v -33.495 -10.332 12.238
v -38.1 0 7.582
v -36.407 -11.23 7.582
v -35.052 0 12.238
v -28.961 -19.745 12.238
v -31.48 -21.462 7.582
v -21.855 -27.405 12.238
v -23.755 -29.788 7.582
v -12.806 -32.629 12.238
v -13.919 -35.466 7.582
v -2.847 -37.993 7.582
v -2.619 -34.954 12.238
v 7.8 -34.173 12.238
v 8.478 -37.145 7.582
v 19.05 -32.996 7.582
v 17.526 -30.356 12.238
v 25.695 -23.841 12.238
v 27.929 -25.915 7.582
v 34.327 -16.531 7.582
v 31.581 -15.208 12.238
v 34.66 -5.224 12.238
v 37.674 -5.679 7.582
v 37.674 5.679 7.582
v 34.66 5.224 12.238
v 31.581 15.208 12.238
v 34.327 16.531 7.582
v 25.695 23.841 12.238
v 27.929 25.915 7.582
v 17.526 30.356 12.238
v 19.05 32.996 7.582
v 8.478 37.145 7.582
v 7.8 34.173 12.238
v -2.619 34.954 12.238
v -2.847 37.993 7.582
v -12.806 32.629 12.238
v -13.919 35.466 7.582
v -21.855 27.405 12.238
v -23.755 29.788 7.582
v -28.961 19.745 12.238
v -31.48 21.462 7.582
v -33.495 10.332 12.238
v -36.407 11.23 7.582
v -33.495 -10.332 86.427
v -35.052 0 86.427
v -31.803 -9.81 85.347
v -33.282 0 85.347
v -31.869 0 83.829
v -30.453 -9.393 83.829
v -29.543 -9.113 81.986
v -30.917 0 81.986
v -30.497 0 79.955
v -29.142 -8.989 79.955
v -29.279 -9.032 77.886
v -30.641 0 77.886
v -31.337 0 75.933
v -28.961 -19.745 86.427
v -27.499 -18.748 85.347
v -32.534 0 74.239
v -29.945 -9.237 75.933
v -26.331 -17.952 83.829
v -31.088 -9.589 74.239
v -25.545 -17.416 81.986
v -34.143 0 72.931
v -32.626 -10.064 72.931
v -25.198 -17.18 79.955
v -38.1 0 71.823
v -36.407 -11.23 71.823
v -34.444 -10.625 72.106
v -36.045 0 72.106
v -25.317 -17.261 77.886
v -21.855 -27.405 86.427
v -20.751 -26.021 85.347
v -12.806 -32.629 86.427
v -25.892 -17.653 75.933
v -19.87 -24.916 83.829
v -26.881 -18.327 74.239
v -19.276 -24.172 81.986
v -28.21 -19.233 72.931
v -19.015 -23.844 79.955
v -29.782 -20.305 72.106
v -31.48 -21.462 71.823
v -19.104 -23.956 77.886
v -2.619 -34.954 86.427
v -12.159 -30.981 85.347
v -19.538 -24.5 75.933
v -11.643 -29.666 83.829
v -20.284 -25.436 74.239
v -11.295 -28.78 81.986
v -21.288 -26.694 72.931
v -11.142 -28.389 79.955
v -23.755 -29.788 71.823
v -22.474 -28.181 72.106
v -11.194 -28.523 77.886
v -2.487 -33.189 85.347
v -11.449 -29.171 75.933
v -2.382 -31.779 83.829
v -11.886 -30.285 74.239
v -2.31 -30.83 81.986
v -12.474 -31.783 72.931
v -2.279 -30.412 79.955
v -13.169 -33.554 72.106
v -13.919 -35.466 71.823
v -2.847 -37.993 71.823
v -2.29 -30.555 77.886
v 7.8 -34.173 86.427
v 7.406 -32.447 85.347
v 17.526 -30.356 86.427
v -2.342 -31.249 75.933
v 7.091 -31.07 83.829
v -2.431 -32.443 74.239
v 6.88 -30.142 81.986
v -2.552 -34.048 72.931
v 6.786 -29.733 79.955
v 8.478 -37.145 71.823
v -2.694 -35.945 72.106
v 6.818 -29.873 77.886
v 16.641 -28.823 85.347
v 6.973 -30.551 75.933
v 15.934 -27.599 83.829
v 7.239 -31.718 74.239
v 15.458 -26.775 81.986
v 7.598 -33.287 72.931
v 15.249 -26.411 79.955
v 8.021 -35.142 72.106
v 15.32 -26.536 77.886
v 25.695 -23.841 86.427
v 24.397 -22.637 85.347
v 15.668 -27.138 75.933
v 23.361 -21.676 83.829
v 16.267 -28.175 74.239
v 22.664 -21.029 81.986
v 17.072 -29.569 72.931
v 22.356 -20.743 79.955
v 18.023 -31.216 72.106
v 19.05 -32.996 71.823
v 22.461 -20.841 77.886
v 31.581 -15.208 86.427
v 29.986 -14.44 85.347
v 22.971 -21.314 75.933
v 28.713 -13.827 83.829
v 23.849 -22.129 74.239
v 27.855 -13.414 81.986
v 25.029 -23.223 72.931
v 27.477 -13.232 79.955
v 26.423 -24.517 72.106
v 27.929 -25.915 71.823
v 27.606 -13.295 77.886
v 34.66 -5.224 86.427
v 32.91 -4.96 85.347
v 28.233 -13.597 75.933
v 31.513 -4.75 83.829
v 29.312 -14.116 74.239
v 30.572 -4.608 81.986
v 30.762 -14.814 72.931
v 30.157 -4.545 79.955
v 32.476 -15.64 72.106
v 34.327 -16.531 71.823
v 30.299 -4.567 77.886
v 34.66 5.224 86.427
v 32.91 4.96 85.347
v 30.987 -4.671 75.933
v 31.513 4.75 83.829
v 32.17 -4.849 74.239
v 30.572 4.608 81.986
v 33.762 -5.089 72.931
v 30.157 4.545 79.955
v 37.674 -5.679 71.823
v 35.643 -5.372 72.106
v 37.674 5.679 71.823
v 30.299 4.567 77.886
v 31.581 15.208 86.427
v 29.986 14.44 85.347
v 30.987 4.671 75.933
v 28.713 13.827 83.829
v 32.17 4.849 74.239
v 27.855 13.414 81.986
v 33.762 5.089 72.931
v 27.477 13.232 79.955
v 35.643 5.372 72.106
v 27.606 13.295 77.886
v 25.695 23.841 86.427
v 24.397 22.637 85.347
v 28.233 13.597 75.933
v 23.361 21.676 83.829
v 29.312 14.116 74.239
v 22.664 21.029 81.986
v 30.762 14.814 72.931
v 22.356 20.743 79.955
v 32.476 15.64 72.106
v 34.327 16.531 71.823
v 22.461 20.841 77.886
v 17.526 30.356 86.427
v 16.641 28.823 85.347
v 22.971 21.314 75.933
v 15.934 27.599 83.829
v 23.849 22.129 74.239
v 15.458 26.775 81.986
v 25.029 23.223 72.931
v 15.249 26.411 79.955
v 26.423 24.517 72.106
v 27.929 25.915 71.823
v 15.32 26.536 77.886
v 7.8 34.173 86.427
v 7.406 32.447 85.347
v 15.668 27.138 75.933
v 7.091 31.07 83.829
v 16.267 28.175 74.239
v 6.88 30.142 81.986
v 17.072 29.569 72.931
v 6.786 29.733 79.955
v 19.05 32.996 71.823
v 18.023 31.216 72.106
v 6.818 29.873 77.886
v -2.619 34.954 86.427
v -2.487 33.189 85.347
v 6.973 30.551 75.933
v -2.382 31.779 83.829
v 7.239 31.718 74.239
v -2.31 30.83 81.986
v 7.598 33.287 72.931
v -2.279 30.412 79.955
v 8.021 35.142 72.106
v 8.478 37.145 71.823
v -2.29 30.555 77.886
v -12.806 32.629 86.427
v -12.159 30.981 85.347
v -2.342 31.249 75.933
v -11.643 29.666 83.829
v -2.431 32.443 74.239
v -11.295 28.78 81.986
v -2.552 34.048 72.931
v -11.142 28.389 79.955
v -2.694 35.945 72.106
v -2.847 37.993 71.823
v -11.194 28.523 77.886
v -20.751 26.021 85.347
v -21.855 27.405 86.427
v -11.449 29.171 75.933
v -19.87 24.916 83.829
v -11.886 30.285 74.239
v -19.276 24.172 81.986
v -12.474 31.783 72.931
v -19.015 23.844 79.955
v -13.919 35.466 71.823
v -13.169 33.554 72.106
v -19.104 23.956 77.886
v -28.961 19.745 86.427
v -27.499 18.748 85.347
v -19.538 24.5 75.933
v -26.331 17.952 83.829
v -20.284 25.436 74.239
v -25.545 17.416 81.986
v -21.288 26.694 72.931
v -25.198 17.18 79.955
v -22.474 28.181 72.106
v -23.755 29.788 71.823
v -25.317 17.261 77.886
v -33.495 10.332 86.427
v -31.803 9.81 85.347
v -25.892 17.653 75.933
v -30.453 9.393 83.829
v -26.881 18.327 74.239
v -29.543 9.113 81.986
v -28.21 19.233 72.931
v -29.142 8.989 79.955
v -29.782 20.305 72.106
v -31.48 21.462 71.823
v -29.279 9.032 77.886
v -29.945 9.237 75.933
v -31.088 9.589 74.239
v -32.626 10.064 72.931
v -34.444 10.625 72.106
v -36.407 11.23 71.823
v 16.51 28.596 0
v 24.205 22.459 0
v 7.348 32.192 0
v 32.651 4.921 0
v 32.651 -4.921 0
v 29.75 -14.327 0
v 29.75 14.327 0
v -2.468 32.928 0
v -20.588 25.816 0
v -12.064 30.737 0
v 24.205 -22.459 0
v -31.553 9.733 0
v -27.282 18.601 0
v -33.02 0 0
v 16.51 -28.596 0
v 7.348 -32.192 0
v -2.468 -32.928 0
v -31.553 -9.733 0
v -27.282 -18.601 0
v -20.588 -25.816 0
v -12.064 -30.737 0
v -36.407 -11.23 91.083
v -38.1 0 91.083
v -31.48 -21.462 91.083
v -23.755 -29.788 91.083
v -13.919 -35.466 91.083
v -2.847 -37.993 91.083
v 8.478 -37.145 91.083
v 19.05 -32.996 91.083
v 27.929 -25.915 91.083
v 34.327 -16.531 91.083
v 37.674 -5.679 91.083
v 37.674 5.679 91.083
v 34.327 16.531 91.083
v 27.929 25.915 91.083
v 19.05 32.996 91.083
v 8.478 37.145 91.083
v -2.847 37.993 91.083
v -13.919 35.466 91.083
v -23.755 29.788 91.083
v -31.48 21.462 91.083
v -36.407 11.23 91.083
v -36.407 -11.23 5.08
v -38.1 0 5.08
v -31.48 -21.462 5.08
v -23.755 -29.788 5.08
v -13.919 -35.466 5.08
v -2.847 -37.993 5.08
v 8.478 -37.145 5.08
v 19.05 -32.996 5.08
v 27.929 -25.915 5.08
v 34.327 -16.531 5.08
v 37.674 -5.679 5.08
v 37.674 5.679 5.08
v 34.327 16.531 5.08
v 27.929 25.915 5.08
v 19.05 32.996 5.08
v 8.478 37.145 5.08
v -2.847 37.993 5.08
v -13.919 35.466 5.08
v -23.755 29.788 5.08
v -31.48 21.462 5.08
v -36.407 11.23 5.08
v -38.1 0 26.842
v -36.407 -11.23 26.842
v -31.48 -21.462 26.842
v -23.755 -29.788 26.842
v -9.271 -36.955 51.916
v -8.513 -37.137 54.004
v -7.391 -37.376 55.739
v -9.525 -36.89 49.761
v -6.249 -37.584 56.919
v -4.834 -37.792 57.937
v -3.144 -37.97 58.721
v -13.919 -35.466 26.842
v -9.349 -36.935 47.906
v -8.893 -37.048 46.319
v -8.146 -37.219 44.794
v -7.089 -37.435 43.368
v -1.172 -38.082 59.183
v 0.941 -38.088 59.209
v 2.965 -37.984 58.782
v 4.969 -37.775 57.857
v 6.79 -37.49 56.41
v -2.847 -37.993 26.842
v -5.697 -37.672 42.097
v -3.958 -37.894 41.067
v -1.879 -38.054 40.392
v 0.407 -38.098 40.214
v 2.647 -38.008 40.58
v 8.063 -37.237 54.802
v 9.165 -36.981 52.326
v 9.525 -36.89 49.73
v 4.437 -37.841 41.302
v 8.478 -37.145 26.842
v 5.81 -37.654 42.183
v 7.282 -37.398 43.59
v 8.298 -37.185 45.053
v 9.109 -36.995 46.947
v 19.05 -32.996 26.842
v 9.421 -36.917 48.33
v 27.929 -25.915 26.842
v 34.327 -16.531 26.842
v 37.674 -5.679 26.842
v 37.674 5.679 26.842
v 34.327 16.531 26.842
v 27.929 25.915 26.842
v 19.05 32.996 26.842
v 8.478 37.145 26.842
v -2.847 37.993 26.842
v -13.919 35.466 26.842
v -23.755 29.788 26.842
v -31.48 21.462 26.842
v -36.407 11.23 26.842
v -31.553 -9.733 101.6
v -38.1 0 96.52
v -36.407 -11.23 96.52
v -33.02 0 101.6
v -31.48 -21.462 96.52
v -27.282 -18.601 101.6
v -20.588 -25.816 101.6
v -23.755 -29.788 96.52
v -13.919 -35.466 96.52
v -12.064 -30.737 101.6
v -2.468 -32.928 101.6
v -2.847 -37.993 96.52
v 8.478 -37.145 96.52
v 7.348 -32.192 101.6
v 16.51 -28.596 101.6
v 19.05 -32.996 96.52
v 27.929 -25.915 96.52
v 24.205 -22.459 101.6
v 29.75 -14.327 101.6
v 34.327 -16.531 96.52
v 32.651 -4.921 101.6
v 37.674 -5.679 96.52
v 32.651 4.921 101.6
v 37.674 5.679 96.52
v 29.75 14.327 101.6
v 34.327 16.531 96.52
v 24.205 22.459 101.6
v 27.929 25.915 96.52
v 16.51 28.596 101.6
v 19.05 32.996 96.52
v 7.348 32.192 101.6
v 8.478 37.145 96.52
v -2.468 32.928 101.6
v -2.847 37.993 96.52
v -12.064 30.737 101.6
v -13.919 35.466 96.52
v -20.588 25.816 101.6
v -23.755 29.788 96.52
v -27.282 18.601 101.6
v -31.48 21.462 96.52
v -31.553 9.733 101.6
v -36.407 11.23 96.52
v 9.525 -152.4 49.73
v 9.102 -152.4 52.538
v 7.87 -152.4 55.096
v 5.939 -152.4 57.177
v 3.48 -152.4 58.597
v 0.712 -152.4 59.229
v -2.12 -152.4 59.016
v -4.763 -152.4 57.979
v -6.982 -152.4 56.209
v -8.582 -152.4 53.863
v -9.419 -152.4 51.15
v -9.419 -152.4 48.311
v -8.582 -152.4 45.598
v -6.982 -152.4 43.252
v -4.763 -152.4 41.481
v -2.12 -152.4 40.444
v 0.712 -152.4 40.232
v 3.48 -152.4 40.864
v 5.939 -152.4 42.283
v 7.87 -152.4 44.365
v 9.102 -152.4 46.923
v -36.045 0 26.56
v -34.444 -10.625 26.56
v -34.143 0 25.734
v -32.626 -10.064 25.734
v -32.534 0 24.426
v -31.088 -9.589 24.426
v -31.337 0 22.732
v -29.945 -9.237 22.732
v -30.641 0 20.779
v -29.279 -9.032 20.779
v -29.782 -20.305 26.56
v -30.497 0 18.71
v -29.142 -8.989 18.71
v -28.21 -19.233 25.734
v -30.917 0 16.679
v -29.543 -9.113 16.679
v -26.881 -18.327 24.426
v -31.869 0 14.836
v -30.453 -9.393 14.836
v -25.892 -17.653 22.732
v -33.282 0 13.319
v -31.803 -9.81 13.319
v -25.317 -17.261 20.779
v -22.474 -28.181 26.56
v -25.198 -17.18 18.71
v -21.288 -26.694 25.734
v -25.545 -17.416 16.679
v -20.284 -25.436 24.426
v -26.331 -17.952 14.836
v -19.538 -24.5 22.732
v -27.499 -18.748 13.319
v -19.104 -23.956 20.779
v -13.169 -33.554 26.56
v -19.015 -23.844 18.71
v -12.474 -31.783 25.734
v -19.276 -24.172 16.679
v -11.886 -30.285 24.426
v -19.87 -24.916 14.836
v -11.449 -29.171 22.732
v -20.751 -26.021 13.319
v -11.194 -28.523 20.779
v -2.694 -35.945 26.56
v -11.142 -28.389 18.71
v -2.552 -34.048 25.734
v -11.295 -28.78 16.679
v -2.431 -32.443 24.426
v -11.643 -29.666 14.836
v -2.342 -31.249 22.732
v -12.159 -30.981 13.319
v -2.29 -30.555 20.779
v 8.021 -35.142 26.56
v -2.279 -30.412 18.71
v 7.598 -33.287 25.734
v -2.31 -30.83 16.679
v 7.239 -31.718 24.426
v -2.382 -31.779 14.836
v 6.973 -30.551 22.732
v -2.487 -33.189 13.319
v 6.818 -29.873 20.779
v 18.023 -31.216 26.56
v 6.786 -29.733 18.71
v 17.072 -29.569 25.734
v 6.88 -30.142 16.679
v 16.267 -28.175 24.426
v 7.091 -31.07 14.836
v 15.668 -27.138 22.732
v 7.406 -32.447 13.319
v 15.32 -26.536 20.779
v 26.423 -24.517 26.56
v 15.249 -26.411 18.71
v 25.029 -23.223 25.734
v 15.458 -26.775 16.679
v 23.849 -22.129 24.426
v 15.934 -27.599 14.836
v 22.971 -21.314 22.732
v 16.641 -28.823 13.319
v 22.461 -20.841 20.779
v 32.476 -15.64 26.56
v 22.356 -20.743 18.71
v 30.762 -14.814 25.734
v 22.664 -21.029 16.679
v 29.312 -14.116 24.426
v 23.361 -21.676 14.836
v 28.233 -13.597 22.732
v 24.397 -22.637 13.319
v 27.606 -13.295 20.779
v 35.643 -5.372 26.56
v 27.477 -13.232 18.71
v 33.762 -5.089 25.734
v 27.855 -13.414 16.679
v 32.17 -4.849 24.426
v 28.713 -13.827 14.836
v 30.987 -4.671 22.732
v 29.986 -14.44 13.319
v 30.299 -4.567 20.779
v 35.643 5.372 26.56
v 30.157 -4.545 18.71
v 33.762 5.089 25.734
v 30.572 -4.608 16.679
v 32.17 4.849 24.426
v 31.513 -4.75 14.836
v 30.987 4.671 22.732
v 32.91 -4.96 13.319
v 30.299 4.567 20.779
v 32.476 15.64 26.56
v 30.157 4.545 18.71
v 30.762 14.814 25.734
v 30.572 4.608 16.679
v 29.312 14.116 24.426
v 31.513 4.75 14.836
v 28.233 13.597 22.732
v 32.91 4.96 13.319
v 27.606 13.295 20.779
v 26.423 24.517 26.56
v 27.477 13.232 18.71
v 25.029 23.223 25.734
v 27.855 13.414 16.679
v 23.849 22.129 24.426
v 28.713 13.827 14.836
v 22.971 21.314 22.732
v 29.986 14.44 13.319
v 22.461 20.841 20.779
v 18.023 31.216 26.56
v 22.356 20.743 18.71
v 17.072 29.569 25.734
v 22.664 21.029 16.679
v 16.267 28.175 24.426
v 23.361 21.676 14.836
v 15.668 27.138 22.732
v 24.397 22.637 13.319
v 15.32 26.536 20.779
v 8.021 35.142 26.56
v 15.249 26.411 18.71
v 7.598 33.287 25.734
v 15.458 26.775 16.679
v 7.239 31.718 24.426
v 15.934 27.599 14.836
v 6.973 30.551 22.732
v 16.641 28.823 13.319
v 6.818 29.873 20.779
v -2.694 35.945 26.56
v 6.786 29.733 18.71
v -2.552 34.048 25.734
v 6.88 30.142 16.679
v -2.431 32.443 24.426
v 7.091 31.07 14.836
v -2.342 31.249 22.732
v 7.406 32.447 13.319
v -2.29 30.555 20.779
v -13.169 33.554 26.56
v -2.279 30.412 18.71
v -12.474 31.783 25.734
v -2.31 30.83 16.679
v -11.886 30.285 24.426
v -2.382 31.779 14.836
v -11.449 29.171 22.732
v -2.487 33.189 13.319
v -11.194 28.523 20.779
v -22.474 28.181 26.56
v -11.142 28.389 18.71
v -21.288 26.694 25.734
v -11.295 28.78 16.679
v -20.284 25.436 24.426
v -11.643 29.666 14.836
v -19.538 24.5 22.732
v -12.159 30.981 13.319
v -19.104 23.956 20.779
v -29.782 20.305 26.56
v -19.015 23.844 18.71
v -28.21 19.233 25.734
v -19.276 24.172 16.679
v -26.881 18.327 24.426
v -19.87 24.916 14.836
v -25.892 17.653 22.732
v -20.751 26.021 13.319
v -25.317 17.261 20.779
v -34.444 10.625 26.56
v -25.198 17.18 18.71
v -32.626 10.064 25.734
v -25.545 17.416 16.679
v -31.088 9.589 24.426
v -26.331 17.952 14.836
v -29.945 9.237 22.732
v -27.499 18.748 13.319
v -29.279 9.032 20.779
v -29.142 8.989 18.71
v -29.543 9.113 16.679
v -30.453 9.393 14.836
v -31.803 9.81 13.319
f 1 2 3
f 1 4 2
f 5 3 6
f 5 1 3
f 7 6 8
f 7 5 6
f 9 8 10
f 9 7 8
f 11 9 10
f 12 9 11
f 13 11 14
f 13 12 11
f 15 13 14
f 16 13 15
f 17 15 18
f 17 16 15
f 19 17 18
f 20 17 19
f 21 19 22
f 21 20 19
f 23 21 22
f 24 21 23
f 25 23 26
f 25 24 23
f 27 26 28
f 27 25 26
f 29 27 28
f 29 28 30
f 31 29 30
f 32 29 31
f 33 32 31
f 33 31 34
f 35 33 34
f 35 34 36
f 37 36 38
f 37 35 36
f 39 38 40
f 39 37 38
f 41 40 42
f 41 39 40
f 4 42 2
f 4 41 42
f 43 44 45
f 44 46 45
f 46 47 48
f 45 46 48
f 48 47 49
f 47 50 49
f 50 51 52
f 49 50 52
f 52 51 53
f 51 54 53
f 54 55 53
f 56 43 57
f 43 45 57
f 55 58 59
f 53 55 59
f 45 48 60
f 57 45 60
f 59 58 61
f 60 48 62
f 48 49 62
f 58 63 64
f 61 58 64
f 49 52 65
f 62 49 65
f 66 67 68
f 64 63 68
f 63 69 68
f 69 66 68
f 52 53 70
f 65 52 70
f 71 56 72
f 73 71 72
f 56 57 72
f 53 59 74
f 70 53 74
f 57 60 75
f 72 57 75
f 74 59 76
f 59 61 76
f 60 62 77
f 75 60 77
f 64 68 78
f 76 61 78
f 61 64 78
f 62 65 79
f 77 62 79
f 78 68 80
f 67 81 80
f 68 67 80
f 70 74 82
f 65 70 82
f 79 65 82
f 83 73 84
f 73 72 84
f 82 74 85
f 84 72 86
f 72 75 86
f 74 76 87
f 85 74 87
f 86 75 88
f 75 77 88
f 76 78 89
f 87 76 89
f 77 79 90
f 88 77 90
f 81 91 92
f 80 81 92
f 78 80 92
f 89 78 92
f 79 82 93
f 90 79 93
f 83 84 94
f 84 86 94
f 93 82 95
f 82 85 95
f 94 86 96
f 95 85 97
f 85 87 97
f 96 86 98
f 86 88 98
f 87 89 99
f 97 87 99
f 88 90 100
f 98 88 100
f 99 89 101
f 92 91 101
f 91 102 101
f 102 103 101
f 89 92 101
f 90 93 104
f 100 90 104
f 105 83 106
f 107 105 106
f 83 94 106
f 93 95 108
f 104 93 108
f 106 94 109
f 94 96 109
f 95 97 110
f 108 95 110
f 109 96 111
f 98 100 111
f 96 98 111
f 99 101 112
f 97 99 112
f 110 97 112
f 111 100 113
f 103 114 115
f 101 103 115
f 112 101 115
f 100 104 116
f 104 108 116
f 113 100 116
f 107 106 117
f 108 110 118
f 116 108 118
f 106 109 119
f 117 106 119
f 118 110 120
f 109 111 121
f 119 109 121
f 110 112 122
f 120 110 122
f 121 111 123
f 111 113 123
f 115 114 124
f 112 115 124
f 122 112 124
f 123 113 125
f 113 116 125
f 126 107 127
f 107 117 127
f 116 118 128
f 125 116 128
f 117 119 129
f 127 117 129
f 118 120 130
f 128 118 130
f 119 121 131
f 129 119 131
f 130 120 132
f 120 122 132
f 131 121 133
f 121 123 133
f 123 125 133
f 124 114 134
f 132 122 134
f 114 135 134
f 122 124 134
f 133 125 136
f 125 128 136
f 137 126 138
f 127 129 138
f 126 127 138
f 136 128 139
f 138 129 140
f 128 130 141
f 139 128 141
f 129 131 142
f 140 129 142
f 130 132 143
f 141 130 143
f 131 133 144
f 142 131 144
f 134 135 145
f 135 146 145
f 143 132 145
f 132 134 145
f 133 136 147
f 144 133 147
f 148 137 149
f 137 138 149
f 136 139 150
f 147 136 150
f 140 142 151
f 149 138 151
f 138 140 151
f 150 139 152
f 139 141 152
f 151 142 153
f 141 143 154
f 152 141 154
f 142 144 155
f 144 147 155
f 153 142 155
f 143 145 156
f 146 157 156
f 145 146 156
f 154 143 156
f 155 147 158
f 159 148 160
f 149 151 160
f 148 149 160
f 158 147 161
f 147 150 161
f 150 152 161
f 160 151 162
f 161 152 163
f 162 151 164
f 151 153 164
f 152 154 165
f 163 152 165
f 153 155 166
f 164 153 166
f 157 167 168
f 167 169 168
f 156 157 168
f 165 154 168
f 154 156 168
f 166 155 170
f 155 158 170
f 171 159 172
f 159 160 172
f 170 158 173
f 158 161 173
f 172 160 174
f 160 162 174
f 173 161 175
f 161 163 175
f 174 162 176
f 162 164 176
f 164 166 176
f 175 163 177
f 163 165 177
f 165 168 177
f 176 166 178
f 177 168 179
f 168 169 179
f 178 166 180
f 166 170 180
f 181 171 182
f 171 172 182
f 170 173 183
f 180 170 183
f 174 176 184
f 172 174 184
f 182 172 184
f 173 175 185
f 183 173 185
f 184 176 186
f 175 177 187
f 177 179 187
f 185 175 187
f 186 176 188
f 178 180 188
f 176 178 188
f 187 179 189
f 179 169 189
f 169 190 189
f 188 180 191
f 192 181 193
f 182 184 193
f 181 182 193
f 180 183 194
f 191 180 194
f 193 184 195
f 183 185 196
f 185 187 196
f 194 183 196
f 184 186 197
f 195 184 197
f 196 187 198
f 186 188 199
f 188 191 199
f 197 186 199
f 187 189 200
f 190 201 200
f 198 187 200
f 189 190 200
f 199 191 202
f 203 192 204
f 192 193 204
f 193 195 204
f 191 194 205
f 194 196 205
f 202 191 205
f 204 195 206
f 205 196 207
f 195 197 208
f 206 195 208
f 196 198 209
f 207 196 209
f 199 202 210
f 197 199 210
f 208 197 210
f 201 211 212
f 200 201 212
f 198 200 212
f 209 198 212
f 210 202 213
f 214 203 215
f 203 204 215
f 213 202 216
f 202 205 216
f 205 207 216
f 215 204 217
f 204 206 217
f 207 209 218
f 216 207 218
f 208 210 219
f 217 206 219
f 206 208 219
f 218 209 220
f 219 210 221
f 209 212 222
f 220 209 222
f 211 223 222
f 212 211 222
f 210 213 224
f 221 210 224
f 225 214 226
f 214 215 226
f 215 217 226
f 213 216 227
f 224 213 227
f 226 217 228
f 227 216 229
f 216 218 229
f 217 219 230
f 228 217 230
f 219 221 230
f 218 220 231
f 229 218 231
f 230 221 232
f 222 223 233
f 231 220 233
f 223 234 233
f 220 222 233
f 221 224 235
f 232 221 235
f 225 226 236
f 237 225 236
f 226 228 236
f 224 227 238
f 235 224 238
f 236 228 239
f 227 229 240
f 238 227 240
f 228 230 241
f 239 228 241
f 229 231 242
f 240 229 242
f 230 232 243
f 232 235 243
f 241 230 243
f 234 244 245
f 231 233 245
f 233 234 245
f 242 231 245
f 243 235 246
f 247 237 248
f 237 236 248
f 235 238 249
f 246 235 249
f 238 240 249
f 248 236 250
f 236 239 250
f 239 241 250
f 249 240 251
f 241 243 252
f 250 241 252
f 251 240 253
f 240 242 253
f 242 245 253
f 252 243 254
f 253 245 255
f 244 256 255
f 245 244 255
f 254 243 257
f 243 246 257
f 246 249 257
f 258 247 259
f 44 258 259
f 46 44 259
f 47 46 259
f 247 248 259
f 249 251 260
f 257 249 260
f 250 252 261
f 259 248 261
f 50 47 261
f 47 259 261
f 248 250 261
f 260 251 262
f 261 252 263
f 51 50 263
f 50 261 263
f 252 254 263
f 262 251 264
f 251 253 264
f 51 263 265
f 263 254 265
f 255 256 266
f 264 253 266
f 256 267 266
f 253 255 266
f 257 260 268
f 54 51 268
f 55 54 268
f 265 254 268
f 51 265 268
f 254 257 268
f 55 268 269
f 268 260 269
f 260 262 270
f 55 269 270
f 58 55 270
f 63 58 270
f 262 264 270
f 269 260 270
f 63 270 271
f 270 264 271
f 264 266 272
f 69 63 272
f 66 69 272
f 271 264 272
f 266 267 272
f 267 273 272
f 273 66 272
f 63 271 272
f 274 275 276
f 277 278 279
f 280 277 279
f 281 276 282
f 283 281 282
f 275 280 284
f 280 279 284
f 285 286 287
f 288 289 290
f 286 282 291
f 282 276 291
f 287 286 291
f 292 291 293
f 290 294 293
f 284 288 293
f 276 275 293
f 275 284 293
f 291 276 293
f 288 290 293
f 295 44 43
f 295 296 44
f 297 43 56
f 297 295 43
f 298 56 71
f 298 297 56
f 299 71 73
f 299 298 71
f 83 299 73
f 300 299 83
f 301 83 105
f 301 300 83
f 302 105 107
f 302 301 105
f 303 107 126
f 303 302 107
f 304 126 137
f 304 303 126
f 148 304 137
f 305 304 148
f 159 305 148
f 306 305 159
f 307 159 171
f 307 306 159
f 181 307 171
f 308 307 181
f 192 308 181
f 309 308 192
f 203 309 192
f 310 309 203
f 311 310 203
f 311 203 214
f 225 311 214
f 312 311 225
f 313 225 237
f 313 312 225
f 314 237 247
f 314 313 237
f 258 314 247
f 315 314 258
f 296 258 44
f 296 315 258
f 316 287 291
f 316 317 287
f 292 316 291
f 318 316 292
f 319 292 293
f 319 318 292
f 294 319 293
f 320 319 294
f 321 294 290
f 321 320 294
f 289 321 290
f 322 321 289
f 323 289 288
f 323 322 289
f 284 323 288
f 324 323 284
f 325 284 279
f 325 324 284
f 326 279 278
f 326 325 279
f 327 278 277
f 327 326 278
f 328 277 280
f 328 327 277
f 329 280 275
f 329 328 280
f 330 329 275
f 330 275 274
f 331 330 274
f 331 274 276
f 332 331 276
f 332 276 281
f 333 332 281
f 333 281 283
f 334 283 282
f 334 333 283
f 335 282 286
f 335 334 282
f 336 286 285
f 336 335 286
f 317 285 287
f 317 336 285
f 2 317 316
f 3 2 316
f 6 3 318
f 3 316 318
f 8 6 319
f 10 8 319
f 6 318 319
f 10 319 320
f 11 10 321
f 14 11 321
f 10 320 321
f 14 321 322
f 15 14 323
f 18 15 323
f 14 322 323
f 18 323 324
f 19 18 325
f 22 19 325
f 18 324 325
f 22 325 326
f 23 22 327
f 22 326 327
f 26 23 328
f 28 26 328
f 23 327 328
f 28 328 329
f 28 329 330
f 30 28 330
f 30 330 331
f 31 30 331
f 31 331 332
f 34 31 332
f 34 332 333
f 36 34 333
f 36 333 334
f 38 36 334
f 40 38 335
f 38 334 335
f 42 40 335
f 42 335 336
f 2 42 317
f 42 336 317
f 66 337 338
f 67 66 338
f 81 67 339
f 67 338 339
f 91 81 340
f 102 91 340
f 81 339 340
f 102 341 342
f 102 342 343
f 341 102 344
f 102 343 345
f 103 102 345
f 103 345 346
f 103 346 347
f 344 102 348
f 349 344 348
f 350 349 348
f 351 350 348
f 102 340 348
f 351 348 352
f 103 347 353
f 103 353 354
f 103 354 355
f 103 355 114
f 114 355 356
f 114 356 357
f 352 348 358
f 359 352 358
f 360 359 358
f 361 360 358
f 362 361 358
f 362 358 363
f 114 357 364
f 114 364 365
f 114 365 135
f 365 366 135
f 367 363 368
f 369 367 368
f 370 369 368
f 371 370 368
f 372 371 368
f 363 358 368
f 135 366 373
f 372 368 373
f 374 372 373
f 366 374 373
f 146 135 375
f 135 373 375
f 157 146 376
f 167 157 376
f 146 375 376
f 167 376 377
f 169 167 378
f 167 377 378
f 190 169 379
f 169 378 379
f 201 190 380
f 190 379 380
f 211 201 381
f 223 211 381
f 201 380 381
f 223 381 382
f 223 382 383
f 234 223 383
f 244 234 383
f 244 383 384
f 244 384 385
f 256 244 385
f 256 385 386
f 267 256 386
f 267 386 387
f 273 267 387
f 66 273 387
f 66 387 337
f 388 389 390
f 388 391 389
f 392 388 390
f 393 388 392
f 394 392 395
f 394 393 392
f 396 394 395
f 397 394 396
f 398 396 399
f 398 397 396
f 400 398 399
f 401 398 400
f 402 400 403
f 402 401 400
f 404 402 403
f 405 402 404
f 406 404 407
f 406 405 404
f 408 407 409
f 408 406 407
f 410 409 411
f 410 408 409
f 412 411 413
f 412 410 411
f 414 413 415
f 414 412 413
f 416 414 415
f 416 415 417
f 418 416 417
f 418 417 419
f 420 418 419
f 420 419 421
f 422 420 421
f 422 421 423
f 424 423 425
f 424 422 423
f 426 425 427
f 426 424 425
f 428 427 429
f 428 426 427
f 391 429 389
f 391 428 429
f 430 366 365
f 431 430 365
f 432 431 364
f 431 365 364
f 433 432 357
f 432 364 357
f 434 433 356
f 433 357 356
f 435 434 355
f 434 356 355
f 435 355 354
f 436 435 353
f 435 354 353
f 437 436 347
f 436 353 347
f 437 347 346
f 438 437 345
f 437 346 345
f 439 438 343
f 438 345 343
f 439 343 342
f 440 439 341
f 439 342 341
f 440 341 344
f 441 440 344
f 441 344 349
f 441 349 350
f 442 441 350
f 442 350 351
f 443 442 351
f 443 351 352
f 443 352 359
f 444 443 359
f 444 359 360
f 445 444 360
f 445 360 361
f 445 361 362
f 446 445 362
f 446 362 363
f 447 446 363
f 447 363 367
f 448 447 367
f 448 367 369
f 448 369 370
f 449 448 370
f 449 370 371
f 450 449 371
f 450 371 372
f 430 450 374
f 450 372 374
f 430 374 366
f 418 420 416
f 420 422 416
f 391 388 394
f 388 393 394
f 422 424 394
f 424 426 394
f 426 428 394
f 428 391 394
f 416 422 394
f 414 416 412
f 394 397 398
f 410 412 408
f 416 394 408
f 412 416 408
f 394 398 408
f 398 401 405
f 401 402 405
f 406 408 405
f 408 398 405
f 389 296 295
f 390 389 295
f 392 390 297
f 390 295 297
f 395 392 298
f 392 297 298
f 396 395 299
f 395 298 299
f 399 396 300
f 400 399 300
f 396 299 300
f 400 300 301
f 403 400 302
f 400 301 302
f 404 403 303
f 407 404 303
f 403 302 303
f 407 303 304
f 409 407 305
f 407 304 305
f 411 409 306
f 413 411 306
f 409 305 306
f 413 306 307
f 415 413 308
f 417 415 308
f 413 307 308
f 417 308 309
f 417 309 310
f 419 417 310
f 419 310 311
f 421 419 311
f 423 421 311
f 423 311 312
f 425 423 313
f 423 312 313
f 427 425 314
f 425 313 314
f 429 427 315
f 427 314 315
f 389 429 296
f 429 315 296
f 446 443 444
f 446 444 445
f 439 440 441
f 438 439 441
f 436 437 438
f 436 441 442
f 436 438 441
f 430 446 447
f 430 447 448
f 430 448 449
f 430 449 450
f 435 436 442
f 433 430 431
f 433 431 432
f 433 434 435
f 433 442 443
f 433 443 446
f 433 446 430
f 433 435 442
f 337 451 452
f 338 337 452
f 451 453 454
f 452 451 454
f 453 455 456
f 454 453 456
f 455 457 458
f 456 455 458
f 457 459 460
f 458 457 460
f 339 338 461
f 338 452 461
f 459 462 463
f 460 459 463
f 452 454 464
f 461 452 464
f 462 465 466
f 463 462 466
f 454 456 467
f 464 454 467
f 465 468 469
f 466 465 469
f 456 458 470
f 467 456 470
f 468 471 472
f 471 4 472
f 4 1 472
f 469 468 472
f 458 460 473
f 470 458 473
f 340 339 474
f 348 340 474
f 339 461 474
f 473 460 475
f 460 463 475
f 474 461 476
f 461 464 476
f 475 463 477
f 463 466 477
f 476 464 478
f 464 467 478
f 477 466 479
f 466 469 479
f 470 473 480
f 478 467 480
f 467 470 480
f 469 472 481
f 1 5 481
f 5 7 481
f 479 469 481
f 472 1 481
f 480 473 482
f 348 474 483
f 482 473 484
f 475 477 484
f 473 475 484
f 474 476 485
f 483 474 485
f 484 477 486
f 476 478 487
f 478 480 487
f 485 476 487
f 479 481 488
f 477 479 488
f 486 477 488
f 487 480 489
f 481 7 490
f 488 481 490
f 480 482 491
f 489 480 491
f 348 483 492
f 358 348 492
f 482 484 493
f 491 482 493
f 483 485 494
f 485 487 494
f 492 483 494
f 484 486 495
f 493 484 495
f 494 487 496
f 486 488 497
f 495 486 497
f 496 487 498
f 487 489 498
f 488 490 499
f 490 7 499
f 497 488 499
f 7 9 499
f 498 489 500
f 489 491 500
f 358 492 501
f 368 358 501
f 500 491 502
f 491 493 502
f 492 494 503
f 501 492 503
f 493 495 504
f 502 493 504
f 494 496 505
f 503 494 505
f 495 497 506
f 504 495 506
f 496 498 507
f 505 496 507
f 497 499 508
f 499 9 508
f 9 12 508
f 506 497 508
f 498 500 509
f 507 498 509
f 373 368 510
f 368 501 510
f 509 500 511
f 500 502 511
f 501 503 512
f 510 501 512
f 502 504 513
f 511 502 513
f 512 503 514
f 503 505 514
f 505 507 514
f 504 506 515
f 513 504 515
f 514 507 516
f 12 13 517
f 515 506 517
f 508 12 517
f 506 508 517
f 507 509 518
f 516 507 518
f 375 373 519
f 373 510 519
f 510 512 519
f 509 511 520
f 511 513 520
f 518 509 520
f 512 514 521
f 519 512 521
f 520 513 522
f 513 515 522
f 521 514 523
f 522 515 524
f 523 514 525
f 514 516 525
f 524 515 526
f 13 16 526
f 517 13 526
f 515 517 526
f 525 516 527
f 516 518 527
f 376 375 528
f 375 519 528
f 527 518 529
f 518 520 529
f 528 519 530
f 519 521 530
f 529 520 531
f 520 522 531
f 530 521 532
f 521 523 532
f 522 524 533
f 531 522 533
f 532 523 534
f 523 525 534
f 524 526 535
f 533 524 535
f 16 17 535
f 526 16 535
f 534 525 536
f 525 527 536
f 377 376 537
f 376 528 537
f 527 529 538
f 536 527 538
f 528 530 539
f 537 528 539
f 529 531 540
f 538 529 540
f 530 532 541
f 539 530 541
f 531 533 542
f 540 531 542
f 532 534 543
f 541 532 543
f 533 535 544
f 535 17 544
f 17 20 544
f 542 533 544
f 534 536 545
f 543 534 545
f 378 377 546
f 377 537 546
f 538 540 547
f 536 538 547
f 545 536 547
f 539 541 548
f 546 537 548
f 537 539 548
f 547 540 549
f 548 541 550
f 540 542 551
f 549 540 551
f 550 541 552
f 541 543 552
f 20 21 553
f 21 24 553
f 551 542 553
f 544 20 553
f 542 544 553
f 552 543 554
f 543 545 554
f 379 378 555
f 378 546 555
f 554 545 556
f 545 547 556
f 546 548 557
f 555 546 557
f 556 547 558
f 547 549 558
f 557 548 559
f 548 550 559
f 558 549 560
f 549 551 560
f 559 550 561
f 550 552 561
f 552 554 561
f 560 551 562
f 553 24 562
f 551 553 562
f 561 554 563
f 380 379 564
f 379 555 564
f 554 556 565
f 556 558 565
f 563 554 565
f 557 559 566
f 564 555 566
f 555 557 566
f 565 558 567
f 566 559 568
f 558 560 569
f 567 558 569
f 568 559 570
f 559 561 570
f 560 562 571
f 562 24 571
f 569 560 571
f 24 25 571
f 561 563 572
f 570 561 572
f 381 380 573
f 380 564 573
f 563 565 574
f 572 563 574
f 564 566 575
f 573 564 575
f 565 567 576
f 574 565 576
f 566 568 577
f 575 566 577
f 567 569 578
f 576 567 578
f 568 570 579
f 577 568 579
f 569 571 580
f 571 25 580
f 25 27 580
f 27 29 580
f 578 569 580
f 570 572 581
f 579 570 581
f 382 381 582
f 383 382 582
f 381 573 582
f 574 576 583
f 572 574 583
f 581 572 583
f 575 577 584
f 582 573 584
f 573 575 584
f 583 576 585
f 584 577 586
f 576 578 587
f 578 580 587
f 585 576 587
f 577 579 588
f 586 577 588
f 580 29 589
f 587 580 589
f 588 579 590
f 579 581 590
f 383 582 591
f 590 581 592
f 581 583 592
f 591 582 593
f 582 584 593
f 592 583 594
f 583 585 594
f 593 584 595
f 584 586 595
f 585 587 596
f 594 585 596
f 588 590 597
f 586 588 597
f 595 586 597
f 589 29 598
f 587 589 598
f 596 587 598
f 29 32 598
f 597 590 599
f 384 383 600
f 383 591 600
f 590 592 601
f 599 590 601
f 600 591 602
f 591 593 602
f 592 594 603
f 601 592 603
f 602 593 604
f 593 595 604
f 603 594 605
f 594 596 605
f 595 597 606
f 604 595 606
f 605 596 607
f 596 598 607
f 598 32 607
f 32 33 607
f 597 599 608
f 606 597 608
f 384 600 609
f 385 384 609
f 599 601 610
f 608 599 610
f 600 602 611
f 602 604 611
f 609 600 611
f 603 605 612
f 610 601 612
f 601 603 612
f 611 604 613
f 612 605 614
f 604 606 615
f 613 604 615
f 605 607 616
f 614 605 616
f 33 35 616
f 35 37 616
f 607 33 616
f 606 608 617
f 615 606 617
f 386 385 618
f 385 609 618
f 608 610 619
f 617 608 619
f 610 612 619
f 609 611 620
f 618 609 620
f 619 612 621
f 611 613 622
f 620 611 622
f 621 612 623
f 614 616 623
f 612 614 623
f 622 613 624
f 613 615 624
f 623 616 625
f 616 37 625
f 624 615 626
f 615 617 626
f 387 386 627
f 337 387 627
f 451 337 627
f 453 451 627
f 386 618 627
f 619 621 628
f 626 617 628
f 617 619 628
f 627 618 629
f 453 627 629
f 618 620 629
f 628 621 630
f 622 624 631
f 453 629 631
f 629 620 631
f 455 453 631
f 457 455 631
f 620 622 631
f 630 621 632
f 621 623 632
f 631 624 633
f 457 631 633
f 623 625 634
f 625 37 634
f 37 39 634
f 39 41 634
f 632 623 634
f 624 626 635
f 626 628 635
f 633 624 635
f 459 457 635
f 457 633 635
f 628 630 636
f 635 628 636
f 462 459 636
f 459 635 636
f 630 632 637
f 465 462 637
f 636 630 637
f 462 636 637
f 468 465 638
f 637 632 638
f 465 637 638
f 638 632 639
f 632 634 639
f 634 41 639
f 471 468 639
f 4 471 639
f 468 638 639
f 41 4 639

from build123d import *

# Parameters (mm, degrees)
F2_R     = 9.525
F3_DEPTH = 152.4


# Not quite as in the source:
# - a fillet or chamfer that OpenCascade refuses, or shapes differently, is made with other operations: its cross-section is extruded or revolved along the edge and cut away or added


with BuildPart() as f1:
    # F0 (on Front) → F1 (revolve)
    with BuildSketch(Plane.XZ):
        with BuildLine():
            Line((-38.1, 0), (0, 0))
            Line((0, 0), (0, 101.6))
            Line((0, 101.6), (-38.1, 101.6))
            Line((-38.1, 101.6), (-38.1, 87.0632982802))
            ThreePointArc((-38.1, 87.0632982802), (-30.48, 79.4432982802), (-38.1, 71.8232982802))
            Line((-38.1, 71.8232982802), (-38.1, 26.8419931632))
            ThreePointArc((-38.1, 26.8419931632), (-30.48, 19.2219931632), (-38.1, 11.6019931632))
            Line((-38.1, 11.6019931632), (-38.1, 0))
        make_face()
    revolve(axis=Axis((0, 0, 50.8), (0, 0, 1)))

    # F2 (on Front) → F3 (join)
    with BuildSketch(Plane.XZ):
        with Locations((0, 49.7302636504)):
            Circle(F2_R)
    extrude(amount=F3_DEPTH)

    # F4: chamfer of 5.08 on 6 edges, made by hand

    # F4_s1 → F4_t2 (revolve, cut)
    with BuildSketch(Plane.XZ):
        Polygon((-38.1, 96.52), (-33.02, 101.6), (-38.1, 101.6), align=None)
    revolve(axis=Axis((0, 0, 101.6), (0, 0, 1)), mode=Mode.SUBTRACT)

    # F4_s3 → F4_t4 (revolve, cut)
    with BuildSketch(Plane.XZ):
        with BuildLine():
            Line((-35.052, 86.4271436394), (-38.1, 91.0830405454))
            Line((-38.1, 91.0830405454), (-38.1, 87.0632982802))
            ThreePointArc((-38.1, 87.0632982802), (-36.4706968515, 86.8870722727), (-35.052, 86.4271436394))
        make_face()
    revolve(axis=Axis((0, 0, 87.0632982802), (0, 0, 1)), mode=Mode.SUBTRACT)

    # F4_s5 → F4_t6 (revolve, cut)
    with BuildSketch(Plane.XZ):
        with BuildLine():
            Line((-38.1, 7.582250898), (-35.052, 12.2381478041))
            ThreePointArc((-35.052, 12.2381478041), (-36.4706968515, 11.7782191708), (-38.1, 11.6019931632))
            Line((-38.1, 11.6019931632), (-38.1, 7.582250898))
        make_face()
    revolve(axis=Axis((0, 0, 11.6019931632), (0, 0, 1)), mode=Mode.SUBTRACT)

    # F4_s7 → F4_t8 (revolve, cut)
    with BuildSketch(Plane.XZ):
        Polygon((-33.02, 0), (-38.1, 5.08), (-38.1, 0), align=None)
    revolve(axis=Axis((0, 0, 0), (0, 0, 1)), mode=Mode.SUBTRACT)


solid = f1.part
